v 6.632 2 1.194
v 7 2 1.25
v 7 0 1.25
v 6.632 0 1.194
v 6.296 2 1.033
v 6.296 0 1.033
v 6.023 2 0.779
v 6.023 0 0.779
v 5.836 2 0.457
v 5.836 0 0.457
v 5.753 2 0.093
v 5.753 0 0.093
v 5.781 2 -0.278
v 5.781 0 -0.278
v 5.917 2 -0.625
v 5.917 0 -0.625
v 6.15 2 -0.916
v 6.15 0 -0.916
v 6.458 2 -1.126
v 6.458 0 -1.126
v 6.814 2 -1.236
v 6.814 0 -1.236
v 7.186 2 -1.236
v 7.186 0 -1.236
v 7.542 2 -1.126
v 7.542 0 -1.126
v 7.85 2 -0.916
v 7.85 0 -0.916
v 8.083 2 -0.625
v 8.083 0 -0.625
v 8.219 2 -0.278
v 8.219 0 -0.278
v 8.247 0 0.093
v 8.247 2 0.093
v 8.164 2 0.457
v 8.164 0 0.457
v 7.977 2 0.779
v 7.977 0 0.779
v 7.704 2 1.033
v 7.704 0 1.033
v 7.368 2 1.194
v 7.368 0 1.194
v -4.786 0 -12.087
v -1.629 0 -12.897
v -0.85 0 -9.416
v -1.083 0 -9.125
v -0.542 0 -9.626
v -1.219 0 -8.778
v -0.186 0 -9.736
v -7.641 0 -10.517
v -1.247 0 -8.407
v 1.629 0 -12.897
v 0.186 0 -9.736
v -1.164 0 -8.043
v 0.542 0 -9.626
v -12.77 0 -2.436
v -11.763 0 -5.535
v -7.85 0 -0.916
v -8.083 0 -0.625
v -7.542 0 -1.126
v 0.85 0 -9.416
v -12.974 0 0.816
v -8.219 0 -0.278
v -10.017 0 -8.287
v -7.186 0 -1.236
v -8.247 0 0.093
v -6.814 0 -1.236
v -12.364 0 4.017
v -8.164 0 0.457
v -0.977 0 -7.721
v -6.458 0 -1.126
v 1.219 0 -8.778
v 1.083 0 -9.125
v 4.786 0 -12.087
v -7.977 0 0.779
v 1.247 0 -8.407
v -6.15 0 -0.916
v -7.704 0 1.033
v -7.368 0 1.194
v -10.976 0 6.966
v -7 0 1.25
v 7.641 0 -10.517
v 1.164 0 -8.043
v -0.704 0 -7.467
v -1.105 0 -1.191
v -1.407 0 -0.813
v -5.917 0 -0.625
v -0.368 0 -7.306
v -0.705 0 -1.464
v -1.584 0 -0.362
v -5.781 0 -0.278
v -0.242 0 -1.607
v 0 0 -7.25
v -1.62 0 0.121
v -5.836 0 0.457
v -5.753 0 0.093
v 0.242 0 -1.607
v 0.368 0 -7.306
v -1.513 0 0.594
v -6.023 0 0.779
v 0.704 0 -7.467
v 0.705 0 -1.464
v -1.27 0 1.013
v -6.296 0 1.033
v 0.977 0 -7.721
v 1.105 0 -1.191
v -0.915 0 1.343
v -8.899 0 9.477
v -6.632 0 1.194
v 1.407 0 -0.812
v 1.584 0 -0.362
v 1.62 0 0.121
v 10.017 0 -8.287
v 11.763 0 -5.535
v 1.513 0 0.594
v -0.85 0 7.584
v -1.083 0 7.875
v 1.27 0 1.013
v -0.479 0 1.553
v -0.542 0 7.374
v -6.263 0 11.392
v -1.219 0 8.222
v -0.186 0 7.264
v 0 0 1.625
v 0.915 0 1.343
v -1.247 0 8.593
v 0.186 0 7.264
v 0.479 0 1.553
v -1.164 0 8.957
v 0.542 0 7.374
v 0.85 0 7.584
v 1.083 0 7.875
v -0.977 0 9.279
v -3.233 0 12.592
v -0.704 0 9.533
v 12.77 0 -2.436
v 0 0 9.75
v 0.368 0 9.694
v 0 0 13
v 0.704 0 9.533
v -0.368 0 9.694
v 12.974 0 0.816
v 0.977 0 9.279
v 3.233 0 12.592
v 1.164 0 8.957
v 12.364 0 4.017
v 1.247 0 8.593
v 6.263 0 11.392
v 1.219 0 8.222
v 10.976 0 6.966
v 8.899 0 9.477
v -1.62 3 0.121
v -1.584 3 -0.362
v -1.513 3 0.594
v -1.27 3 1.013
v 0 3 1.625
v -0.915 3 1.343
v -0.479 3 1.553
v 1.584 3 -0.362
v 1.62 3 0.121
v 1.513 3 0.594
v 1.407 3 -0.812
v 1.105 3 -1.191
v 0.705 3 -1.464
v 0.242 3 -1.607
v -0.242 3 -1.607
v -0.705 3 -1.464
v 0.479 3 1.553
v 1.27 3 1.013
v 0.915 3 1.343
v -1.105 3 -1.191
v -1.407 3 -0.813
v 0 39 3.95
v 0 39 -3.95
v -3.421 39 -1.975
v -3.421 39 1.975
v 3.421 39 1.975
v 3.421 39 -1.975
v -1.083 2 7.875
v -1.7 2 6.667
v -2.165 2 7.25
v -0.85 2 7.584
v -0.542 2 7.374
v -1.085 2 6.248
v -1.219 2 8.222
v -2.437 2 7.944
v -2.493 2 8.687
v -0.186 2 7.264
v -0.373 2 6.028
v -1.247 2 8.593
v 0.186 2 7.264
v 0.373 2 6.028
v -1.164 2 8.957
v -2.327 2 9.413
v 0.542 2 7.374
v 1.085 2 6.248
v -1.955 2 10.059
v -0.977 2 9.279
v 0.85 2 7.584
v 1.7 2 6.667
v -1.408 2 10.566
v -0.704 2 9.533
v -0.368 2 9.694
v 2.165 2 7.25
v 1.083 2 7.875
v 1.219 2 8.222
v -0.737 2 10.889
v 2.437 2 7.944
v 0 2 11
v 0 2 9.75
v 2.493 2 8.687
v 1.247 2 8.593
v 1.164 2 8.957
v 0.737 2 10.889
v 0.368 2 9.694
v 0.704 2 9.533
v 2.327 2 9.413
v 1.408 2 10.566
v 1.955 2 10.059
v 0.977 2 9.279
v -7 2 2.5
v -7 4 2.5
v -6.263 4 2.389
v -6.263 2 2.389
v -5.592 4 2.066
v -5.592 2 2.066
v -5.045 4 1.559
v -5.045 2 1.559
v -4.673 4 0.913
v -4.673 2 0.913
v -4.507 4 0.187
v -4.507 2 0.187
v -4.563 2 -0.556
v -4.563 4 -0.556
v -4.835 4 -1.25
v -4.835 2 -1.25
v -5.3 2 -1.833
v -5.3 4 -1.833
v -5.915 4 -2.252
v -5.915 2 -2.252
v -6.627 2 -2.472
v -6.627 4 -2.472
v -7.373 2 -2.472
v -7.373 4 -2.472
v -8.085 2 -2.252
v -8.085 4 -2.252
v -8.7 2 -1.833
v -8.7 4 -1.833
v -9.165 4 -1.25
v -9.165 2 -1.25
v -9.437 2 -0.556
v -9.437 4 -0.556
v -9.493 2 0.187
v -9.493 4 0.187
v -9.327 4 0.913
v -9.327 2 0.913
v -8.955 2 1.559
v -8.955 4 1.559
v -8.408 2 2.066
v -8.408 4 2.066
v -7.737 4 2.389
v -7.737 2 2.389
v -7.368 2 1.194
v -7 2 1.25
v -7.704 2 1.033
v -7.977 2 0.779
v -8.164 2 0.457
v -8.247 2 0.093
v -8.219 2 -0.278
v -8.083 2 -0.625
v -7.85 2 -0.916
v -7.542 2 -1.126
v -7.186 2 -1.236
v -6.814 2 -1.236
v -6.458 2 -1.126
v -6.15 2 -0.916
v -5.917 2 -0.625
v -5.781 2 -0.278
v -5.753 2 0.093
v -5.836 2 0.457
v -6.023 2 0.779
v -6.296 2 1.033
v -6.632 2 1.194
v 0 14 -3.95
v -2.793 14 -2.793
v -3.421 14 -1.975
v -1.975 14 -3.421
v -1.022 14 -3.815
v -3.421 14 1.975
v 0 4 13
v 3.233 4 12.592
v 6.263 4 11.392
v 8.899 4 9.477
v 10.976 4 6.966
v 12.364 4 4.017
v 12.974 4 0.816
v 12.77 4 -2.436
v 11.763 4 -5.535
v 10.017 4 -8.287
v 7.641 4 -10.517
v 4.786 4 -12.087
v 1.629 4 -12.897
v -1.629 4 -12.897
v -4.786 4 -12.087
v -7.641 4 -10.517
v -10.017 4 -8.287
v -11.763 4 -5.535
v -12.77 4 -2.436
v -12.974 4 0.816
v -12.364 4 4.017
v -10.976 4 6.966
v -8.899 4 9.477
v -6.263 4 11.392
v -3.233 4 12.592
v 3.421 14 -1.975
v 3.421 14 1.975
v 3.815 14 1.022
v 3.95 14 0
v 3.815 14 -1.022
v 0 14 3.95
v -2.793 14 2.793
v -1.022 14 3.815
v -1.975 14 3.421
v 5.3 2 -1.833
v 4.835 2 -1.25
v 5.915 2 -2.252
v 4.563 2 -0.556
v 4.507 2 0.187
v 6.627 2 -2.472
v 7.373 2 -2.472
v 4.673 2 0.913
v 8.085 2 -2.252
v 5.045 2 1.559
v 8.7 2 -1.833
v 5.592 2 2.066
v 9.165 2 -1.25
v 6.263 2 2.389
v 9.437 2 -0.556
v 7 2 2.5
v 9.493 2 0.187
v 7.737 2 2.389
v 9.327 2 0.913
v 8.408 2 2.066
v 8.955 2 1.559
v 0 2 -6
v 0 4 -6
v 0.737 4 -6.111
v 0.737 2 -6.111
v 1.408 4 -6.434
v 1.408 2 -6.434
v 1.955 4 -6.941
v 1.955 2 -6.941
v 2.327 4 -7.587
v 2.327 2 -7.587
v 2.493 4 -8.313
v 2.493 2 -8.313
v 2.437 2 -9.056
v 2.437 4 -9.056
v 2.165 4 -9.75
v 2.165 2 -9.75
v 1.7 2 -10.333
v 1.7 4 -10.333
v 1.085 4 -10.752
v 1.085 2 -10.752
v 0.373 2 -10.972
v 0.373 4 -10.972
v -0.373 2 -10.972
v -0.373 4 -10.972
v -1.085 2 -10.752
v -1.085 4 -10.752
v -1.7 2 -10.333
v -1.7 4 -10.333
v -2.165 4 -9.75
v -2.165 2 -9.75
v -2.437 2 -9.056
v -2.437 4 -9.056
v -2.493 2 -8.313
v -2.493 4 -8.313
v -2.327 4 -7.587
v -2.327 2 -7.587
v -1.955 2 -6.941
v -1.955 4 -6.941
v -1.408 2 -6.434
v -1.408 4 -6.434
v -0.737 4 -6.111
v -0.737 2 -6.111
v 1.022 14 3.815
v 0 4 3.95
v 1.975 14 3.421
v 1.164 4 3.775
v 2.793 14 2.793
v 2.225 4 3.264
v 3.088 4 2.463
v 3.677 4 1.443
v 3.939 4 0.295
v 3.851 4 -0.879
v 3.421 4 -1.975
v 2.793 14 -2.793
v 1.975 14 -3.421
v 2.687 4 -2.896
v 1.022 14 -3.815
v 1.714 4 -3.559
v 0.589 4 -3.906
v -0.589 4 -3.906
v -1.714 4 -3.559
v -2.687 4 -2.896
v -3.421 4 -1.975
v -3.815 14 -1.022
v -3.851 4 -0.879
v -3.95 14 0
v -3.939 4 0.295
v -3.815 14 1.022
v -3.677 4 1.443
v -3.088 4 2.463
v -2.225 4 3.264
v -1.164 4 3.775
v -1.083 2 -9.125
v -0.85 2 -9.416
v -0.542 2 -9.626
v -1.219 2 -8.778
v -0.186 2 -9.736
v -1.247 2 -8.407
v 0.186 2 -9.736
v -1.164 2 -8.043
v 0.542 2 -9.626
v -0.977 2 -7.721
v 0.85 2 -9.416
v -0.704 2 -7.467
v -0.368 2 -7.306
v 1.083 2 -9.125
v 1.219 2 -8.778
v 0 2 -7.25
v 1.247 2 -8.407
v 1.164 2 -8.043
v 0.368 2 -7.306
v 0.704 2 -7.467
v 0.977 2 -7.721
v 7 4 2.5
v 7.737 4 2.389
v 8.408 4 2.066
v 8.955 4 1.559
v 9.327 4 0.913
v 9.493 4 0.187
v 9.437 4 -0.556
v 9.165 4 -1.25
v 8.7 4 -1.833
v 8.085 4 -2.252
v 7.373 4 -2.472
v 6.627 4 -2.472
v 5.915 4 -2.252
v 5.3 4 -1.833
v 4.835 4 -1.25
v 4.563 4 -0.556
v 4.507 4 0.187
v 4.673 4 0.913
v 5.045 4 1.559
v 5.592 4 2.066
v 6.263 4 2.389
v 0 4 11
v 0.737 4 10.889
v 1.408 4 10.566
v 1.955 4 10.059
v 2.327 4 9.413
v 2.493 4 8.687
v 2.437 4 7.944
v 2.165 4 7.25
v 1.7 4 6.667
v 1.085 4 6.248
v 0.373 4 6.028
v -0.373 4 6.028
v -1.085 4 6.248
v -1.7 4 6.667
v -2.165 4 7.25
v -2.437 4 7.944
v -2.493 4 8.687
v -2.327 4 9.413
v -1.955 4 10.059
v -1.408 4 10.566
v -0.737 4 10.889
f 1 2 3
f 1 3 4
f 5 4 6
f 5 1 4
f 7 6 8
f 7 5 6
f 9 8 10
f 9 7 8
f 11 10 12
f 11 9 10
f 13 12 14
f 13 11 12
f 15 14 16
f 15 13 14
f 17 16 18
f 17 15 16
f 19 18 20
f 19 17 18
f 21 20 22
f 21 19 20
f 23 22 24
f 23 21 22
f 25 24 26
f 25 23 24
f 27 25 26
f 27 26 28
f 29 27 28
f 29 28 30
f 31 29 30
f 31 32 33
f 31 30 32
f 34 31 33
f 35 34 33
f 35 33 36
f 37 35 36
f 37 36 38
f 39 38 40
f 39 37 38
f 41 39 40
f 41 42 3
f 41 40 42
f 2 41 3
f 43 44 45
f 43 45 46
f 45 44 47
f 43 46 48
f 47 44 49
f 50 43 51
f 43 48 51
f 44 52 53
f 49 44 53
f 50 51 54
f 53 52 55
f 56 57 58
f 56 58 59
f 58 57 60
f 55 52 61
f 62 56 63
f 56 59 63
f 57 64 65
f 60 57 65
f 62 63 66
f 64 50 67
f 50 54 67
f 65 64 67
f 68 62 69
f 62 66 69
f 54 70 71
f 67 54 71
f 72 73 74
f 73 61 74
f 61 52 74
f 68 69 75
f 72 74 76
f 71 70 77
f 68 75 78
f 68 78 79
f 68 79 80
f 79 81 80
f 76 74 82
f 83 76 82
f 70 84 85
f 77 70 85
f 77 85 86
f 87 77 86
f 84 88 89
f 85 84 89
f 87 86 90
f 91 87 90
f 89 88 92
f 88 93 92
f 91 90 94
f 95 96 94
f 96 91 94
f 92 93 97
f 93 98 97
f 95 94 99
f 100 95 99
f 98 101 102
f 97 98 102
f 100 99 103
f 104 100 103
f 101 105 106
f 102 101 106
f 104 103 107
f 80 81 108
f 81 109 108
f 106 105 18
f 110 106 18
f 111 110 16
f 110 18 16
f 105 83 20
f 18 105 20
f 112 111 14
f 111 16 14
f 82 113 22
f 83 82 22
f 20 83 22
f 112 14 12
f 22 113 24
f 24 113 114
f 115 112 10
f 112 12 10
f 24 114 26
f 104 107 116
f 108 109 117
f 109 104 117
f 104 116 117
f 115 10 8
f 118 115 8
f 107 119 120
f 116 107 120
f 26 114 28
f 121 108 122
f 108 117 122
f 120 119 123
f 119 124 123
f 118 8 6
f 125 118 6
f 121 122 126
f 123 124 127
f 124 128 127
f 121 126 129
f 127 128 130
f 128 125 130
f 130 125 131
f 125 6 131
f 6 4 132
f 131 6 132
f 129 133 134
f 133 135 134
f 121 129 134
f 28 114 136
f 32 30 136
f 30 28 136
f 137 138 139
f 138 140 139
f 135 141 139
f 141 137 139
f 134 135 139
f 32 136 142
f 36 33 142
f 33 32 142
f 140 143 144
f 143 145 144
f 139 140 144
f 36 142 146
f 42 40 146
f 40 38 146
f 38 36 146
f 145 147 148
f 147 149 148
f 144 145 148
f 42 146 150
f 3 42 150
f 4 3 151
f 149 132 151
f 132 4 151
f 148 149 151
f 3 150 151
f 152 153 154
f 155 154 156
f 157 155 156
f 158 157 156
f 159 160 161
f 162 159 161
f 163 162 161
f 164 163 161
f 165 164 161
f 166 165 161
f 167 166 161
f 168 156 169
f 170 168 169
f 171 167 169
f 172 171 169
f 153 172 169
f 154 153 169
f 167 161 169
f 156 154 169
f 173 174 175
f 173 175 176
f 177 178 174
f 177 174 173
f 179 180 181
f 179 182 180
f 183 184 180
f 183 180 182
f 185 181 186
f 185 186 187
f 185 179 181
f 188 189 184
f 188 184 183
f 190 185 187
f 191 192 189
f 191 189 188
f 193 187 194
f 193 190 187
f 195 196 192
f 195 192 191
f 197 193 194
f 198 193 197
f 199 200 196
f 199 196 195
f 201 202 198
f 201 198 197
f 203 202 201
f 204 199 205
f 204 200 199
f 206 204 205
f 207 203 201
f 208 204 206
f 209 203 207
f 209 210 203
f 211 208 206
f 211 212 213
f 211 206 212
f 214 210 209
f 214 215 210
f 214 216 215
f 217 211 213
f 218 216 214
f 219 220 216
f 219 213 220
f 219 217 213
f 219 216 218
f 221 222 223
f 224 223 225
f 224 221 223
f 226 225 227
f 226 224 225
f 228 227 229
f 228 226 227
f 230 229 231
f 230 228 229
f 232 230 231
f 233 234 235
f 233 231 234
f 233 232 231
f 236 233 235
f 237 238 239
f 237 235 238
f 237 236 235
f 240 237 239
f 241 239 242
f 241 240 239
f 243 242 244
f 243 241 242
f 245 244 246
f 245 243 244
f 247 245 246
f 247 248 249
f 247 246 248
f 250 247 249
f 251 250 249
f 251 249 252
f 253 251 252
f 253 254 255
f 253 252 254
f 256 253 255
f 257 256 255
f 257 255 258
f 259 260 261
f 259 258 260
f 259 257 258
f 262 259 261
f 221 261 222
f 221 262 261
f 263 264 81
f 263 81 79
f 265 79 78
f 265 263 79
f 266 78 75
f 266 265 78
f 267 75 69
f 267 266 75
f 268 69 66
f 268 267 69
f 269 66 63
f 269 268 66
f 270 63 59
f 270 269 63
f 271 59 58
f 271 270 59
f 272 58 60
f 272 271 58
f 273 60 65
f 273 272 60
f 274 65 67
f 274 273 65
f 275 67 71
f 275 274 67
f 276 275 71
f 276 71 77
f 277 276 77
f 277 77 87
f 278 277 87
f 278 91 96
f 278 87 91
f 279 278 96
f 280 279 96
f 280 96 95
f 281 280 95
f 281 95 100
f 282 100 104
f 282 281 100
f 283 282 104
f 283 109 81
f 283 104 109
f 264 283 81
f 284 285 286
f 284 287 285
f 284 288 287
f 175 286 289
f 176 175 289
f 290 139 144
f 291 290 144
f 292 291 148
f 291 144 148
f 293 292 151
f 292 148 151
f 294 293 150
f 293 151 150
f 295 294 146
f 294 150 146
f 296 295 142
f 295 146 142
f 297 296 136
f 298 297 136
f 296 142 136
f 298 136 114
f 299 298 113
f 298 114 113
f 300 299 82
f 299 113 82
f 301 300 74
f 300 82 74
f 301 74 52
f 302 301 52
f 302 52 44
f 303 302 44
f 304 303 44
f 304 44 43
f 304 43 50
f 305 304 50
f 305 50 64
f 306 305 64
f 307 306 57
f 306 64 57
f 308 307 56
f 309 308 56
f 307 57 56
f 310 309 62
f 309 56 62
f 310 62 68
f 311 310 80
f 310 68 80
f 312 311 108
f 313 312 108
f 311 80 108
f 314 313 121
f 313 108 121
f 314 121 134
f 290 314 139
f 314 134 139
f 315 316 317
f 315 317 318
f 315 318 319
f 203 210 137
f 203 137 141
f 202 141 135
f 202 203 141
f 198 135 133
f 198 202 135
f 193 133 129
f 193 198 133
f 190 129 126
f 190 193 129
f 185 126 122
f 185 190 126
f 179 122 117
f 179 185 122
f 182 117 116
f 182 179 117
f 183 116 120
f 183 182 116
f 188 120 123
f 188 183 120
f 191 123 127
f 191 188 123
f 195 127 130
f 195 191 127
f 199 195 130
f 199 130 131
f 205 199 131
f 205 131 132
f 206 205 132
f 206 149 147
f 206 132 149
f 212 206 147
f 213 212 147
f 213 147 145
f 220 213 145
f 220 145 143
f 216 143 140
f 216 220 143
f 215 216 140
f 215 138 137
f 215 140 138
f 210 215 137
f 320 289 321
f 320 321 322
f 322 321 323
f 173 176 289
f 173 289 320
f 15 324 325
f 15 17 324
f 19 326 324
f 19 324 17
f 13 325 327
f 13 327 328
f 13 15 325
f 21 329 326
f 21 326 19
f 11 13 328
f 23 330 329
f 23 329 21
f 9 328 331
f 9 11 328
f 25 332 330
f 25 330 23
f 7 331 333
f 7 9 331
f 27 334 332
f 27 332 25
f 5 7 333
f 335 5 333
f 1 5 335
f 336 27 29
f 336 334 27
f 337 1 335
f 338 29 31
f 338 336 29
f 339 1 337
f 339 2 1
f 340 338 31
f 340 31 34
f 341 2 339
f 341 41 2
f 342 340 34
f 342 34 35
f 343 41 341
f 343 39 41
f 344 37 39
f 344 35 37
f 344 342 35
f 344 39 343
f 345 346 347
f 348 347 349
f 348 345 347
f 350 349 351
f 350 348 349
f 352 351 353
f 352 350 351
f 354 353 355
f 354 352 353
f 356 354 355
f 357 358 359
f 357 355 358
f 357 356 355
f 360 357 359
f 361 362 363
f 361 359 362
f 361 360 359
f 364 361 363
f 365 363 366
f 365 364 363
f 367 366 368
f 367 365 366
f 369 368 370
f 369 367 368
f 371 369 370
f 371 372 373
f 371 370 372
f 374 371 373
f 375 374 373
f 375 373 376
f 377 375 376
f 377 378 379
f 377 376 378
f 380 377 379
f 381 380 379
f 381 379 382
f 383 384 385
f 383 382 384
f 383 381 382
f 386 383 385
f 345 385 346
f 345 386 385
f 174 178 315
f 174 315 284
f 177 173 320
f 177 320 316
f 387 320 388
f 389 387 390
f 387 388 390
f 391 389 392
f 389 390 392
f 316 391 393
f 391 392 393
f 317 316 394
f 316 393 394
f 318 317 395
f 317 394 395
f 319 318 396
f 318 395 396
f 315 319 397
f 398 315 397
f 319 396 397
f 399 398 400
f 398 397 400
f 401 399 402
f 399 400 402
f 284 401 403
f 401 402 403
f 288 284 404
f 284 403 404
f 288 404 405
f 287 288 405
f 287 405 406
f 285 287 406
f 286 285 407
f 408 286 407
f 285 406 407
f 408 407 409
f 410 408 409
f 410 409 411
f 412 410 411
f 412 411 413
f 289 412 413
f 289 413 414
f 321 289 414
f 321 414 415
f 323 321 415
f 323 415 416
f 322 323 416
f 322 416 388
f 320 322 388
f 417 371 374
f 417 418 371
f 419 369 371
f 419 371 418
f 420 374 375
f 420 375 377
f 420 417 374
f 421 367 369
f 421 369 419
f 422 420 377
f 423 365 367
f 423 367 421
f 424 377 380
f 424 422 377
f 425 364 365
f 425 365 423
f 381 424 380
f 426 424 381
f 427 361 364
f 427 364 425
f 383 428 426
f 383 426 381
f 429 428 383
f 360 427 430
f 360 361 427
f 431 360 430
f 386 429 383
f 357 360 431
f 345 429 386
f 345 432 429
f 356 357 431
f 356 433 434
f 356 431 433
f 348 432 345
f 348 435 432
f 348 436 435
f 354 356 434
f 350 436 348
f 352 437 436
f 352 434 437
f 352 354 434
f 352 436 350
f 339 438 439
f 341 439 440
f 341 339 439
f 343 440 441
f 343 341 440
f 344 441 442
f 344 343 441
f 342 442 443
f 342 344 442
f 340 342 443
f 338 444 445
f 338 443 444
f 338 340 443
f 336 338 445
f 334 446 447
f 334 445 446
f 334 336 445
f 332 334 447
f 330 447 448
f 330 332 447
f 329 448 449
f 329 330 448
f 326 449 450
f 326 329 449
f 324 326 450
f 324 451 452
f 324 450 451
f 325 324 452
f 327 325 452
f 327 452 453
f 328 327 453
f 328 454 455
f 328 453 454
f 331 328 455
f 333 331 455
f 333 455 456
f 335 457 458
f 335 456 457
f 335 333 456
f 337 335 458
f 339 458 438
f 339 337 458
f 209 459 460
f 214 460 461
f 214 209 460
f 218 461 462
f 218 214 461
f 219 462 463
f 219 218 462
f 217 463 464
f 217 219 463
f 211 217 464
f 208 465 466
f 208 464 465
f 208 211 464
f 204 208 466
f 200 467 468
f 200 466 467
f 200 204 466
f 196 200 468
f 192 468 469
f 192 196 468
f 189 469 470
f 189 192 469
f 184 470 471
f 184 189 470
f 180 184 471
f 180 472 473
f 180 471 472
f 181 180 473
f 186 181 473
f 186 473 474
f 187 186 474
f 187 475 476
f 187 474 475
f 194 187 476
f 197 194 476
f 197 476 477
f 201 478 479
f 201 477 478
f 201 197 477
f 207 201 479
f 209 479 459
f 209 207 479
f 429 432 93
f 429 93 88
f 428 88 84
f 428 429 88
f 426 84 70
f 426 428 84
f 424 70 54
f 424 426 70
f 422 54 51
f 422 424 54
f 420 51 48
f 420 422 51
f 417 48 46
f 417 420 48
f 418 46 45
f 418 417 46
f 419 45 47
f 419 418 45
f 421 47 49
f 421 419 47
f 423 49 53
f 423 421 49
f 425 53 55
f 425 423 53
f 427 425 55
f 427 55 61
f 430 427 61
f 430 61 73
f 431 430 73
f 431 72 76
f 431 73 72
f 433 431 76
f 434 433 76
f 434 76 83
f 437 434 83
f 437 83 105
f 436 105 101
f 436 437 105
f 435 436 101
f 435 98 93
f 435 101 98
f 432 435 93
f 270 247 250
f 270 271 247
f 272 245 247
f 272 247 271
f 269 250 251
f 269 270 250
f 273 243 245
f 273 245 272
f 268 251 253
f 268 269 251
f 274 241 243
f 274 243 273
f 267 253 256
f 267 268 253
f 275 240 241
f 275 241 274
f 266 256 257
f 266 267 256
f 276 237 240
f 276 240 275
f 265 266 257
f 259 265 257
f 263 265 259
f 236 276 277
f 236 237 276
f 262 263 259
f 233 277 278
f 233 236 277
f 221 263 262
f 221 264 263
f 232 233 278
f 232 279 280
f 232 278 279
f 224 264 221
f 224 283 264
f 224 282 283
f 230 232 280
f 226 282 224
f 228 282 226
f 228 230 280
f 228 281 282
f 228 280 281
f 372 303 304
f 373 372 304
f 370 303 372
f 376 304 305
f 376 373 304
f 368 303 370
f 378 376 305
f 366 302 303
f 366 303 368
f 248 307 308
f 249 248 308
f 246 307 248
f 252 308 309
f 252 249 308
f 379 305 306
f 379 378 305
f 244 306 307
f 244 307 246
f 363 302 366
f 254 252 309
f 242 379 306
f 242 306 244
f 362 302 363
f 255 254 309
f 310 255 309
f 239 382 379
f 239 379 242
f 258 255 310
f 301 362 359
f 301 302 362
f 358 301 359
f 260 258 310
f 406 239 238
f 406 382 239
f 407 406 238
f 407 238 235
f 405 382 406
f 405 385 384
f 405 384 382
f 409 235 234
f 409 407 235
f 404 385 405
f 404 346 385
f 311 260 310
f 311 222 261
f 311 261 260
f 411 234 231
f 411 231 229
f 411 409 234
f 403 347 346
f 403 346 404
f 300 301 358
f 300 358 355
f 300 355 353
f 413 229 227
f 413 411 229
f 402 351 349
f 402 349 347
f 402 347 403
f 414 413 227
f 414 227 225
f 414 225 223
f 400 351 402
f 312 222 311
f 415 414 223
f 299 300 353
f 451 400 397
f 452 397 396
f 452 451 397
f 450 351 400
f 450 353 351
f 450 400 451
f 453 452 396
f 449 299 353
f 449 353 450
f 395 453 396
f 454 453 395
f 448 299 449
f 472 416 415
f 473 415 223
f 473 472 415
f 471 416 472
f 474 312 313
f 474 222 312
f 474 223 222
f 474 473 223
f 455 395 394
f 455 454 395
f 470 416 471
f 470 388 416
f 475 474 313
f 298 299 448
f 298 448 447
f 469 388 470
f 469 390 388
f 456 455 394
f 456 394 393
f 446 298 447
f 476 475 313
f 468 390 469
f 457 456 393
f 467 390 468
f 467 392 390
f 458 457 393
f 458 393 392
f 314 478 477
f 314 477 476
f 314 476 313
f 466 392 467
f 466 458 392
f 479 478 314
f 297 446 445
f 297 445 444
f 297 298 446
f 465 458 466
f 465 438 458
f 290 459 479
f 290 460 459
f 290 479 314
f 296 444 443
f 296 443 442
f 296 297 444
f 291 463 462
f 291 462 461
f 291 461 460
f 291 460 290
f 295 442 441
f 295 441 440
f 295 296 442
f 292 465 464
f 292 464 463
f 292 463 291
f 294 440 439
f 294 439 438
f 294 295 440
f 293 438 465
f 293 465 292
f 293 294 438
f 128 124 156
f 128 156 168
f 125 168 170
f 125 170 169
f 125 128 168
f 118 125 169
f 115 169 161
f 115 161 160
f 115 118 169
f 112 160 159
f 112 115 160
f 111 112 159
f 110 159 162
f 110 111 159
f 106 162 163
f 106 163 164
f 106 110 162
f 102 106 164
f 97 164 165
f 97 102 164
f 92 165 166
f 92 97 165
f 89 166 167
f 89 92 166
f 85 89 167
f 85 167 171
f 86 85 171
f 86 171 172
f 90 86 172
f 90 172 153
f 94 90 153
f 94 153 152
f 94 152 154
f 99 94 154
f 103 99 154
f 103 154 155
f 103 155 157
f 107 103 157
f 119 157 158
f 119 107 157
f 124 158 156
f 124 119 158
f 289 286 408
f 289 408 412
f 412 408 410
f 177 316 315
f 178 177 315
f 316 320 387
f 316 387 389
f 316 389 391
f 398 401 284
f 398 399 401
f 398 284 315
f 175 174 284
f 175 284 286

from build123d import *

# Parameters (mm, degrees)
CROQUIS3_R                 = 13
SALIENTE_EXTRUIR1_DEPTH    = 4
CROQUIS4_R                 = 3.95
SALIENTE_EXTRUIR2_DEPTH    = 35
CORTAR_EXTRUIR3_DEPTH      = 44.116122275
CORTAR_EXTRUIR3_DEPTH_BACK = 44.116122275
CROQUIS8_R                 = 1.25
CORTAR_EXTRUIR5_DEPTH      = 40.534794802
CORTAR_EXTRUIR5_DEPTH_BACK = 2
CROQUIS10_R                = 2.5
CROQUIS10_R_2              = 1.25
CROQUIS9_R                 = 1.625
CORTAR_EXTRUIR4_DEPTH      = 3
CROQUIS12_OUTSIDE_W        = 38.72
CROQUIS12_OUTSIDE_H        = 38.72
CORTAR_EXTRUIR7_DEPTH      = 25


with BuildPart() as part:
    # Croquis3 → Saliente-Extruir1 (new body)
    with BuildSketch(Plane(origin=(0, 0, 0), x_dir=(1, 0, 0), z_dir=(0, 1, 0))):
        with Locations(Location((0, 0, 0), (0, 0, 270))):
            Circle(CROQUIS3_R)
    extrude(amount=SALIENTE_EXTRUIR1_DEPTH)

    # Croquis4 → Saliente-Extruir2 (add)
    with BuildSketch(Plane(origin=(0, 4, 0), x_dir=(1, 0, 0), z_dir=(0, 1, 0))):
        with Locations(Location((0, 0, 0), (0, 0, 270))):
            Circle(CROQUIS4_R)
    extrude(amount=SALIENTE_EXTRUIR2_DEPTH)

    # Croquis8 → Cortar-Extruir3 (cut, two sides: drawn at the far end of the back side and taken through both)
    with BuildSketch(Plane.XZ.offset(-CORTAR_EXTRUIR3_DEPTH_BACK)):
        with Locations(Location((0, 8.5, 0), (0, 0, 90))):
            Circle(CROQUIS8_R)
        with Locations(Location((0, -8.5, 0), (0, 0, 90))):
            Circle(CROQUIS8_R)
        with Locations(Location((-7, 0, 0), (0, 0, 90))):
            Circle(CROQUIS8_R)
        with Locations(Location((7, 0, 0), (0, 0, 90))):
            Circle(CROQUIS8_R)
    extrude(amount=CORTAR_EXTRUIR3_DEPTH + CORTAR_EXTRUIR3_DEPTH_BACK, mode=Mode.SUBTRACT)

    # Croquis10 → Cortar-Extruir5 (cut, two sides: drawn at the far end of the back side and taken through both)
    # profile 1 of 4: a face of its own
    with BuildSketch(Plane(origin=(0, 4, 0), x_dir=(1, 0, 0), z_dir=(0, 1, 0)).offset(-CORTAR_EXTRUIR5_DEPTH_BACK)):
        with Locations(Location((0, 8.5, 0), (0, 0, 270))):
            Circle(CROQUIS10_R)
    # profile 2 of 4: a face of its own
    with BuildSketch(Plane(origin=(0, 4, 0), x_dir=(1, 0, 0), z_dir=(0, 1, 0)).offset(-CORTAR_EXTRUIR5_DEPTH_BACK)):
        with Locations(Location((0, -8.5, 0), (0, 0, 270))):
            Circle(CROQUIS10_R)
    # profile 3 of 4: a face of its own
    with BuildSketch(Plane(origin=(0, 4, 0), x_dir=(1, 0, 0), z_dir=(0, 1, 0)).offset(-CORTAR_EXTRUIR5_DEPTH_BACK)):
        with Locations(Location((-7, 0, 0), (0, 0, 270))):
            Circle(CROQUIS10_R)
        with Locations(Location((-7, 0, 0), (0, 0, 270))):
            Circle(CROQUIS10_R_2, mode=Mode.SUBTRACT)
    # profile 4 of 4: a face of its own
    with BuildSketch(Plane(origin=(0, 4, 0), x_dir=(1, 0, 0), z_dir=(0, 1, 0)).offset(-CORTAR_EXTRUIR5_DEPTH_BACK)):
        with Locations(Location((7, 0, 0), (0, 0, 270))):
            Circle(CROQUIS10_R)
        with Locations(Location((7, 0, 0), (0, 0, 270))):
            Circle(CROQUIS10_R_2, mode=Mode.SUBTRACT)
    extrude(amount=CORTAR_EXTRUIR5_DEPTH + CORTAR_EXTRUIR5_DEPTH_BACK, mode=Mode.SUBTRACT)

    # Croquis9 → Cortar-Extruir4 (cut)
    with BuildSketch(Plane(origin=(0, 0, 0), x_dir=(1, 0, 0), z_dir=(0, 1, 0))):
        with Locations(Location((0, 0, 0), (0, 0, 270))):
            Circle(CROQUIS9_R)
    extrude(amount=CORTAR_EXTRUIR4_DEPTH, mode=Mode.SUBTRACT)

    # Croquis12 outside → Cortar-Extruir7 (cut)
    with BuildSketch(Plane(origin=(0, 39, 0), x_dir=(1, 0, 0), z_dir=(0, 1, 0))):
        Rectangle(CROQUIS12_OUTSIDE_W, CROQUIS12_OUTSIDE_H)
        Polygon((0, 3.95), (-3.420800345, 1.975), (-3.420800345, -1.975), (0, -3.95), (3.420800345, -1.975), (3.420800345, 1.975), align=None, mode=Mode.SUBTRACT)
    extrude(amount=-CORTAR_EXTRUIR7_DEPTH, mode=Mode.SUBTRACT)


solid = part.part
